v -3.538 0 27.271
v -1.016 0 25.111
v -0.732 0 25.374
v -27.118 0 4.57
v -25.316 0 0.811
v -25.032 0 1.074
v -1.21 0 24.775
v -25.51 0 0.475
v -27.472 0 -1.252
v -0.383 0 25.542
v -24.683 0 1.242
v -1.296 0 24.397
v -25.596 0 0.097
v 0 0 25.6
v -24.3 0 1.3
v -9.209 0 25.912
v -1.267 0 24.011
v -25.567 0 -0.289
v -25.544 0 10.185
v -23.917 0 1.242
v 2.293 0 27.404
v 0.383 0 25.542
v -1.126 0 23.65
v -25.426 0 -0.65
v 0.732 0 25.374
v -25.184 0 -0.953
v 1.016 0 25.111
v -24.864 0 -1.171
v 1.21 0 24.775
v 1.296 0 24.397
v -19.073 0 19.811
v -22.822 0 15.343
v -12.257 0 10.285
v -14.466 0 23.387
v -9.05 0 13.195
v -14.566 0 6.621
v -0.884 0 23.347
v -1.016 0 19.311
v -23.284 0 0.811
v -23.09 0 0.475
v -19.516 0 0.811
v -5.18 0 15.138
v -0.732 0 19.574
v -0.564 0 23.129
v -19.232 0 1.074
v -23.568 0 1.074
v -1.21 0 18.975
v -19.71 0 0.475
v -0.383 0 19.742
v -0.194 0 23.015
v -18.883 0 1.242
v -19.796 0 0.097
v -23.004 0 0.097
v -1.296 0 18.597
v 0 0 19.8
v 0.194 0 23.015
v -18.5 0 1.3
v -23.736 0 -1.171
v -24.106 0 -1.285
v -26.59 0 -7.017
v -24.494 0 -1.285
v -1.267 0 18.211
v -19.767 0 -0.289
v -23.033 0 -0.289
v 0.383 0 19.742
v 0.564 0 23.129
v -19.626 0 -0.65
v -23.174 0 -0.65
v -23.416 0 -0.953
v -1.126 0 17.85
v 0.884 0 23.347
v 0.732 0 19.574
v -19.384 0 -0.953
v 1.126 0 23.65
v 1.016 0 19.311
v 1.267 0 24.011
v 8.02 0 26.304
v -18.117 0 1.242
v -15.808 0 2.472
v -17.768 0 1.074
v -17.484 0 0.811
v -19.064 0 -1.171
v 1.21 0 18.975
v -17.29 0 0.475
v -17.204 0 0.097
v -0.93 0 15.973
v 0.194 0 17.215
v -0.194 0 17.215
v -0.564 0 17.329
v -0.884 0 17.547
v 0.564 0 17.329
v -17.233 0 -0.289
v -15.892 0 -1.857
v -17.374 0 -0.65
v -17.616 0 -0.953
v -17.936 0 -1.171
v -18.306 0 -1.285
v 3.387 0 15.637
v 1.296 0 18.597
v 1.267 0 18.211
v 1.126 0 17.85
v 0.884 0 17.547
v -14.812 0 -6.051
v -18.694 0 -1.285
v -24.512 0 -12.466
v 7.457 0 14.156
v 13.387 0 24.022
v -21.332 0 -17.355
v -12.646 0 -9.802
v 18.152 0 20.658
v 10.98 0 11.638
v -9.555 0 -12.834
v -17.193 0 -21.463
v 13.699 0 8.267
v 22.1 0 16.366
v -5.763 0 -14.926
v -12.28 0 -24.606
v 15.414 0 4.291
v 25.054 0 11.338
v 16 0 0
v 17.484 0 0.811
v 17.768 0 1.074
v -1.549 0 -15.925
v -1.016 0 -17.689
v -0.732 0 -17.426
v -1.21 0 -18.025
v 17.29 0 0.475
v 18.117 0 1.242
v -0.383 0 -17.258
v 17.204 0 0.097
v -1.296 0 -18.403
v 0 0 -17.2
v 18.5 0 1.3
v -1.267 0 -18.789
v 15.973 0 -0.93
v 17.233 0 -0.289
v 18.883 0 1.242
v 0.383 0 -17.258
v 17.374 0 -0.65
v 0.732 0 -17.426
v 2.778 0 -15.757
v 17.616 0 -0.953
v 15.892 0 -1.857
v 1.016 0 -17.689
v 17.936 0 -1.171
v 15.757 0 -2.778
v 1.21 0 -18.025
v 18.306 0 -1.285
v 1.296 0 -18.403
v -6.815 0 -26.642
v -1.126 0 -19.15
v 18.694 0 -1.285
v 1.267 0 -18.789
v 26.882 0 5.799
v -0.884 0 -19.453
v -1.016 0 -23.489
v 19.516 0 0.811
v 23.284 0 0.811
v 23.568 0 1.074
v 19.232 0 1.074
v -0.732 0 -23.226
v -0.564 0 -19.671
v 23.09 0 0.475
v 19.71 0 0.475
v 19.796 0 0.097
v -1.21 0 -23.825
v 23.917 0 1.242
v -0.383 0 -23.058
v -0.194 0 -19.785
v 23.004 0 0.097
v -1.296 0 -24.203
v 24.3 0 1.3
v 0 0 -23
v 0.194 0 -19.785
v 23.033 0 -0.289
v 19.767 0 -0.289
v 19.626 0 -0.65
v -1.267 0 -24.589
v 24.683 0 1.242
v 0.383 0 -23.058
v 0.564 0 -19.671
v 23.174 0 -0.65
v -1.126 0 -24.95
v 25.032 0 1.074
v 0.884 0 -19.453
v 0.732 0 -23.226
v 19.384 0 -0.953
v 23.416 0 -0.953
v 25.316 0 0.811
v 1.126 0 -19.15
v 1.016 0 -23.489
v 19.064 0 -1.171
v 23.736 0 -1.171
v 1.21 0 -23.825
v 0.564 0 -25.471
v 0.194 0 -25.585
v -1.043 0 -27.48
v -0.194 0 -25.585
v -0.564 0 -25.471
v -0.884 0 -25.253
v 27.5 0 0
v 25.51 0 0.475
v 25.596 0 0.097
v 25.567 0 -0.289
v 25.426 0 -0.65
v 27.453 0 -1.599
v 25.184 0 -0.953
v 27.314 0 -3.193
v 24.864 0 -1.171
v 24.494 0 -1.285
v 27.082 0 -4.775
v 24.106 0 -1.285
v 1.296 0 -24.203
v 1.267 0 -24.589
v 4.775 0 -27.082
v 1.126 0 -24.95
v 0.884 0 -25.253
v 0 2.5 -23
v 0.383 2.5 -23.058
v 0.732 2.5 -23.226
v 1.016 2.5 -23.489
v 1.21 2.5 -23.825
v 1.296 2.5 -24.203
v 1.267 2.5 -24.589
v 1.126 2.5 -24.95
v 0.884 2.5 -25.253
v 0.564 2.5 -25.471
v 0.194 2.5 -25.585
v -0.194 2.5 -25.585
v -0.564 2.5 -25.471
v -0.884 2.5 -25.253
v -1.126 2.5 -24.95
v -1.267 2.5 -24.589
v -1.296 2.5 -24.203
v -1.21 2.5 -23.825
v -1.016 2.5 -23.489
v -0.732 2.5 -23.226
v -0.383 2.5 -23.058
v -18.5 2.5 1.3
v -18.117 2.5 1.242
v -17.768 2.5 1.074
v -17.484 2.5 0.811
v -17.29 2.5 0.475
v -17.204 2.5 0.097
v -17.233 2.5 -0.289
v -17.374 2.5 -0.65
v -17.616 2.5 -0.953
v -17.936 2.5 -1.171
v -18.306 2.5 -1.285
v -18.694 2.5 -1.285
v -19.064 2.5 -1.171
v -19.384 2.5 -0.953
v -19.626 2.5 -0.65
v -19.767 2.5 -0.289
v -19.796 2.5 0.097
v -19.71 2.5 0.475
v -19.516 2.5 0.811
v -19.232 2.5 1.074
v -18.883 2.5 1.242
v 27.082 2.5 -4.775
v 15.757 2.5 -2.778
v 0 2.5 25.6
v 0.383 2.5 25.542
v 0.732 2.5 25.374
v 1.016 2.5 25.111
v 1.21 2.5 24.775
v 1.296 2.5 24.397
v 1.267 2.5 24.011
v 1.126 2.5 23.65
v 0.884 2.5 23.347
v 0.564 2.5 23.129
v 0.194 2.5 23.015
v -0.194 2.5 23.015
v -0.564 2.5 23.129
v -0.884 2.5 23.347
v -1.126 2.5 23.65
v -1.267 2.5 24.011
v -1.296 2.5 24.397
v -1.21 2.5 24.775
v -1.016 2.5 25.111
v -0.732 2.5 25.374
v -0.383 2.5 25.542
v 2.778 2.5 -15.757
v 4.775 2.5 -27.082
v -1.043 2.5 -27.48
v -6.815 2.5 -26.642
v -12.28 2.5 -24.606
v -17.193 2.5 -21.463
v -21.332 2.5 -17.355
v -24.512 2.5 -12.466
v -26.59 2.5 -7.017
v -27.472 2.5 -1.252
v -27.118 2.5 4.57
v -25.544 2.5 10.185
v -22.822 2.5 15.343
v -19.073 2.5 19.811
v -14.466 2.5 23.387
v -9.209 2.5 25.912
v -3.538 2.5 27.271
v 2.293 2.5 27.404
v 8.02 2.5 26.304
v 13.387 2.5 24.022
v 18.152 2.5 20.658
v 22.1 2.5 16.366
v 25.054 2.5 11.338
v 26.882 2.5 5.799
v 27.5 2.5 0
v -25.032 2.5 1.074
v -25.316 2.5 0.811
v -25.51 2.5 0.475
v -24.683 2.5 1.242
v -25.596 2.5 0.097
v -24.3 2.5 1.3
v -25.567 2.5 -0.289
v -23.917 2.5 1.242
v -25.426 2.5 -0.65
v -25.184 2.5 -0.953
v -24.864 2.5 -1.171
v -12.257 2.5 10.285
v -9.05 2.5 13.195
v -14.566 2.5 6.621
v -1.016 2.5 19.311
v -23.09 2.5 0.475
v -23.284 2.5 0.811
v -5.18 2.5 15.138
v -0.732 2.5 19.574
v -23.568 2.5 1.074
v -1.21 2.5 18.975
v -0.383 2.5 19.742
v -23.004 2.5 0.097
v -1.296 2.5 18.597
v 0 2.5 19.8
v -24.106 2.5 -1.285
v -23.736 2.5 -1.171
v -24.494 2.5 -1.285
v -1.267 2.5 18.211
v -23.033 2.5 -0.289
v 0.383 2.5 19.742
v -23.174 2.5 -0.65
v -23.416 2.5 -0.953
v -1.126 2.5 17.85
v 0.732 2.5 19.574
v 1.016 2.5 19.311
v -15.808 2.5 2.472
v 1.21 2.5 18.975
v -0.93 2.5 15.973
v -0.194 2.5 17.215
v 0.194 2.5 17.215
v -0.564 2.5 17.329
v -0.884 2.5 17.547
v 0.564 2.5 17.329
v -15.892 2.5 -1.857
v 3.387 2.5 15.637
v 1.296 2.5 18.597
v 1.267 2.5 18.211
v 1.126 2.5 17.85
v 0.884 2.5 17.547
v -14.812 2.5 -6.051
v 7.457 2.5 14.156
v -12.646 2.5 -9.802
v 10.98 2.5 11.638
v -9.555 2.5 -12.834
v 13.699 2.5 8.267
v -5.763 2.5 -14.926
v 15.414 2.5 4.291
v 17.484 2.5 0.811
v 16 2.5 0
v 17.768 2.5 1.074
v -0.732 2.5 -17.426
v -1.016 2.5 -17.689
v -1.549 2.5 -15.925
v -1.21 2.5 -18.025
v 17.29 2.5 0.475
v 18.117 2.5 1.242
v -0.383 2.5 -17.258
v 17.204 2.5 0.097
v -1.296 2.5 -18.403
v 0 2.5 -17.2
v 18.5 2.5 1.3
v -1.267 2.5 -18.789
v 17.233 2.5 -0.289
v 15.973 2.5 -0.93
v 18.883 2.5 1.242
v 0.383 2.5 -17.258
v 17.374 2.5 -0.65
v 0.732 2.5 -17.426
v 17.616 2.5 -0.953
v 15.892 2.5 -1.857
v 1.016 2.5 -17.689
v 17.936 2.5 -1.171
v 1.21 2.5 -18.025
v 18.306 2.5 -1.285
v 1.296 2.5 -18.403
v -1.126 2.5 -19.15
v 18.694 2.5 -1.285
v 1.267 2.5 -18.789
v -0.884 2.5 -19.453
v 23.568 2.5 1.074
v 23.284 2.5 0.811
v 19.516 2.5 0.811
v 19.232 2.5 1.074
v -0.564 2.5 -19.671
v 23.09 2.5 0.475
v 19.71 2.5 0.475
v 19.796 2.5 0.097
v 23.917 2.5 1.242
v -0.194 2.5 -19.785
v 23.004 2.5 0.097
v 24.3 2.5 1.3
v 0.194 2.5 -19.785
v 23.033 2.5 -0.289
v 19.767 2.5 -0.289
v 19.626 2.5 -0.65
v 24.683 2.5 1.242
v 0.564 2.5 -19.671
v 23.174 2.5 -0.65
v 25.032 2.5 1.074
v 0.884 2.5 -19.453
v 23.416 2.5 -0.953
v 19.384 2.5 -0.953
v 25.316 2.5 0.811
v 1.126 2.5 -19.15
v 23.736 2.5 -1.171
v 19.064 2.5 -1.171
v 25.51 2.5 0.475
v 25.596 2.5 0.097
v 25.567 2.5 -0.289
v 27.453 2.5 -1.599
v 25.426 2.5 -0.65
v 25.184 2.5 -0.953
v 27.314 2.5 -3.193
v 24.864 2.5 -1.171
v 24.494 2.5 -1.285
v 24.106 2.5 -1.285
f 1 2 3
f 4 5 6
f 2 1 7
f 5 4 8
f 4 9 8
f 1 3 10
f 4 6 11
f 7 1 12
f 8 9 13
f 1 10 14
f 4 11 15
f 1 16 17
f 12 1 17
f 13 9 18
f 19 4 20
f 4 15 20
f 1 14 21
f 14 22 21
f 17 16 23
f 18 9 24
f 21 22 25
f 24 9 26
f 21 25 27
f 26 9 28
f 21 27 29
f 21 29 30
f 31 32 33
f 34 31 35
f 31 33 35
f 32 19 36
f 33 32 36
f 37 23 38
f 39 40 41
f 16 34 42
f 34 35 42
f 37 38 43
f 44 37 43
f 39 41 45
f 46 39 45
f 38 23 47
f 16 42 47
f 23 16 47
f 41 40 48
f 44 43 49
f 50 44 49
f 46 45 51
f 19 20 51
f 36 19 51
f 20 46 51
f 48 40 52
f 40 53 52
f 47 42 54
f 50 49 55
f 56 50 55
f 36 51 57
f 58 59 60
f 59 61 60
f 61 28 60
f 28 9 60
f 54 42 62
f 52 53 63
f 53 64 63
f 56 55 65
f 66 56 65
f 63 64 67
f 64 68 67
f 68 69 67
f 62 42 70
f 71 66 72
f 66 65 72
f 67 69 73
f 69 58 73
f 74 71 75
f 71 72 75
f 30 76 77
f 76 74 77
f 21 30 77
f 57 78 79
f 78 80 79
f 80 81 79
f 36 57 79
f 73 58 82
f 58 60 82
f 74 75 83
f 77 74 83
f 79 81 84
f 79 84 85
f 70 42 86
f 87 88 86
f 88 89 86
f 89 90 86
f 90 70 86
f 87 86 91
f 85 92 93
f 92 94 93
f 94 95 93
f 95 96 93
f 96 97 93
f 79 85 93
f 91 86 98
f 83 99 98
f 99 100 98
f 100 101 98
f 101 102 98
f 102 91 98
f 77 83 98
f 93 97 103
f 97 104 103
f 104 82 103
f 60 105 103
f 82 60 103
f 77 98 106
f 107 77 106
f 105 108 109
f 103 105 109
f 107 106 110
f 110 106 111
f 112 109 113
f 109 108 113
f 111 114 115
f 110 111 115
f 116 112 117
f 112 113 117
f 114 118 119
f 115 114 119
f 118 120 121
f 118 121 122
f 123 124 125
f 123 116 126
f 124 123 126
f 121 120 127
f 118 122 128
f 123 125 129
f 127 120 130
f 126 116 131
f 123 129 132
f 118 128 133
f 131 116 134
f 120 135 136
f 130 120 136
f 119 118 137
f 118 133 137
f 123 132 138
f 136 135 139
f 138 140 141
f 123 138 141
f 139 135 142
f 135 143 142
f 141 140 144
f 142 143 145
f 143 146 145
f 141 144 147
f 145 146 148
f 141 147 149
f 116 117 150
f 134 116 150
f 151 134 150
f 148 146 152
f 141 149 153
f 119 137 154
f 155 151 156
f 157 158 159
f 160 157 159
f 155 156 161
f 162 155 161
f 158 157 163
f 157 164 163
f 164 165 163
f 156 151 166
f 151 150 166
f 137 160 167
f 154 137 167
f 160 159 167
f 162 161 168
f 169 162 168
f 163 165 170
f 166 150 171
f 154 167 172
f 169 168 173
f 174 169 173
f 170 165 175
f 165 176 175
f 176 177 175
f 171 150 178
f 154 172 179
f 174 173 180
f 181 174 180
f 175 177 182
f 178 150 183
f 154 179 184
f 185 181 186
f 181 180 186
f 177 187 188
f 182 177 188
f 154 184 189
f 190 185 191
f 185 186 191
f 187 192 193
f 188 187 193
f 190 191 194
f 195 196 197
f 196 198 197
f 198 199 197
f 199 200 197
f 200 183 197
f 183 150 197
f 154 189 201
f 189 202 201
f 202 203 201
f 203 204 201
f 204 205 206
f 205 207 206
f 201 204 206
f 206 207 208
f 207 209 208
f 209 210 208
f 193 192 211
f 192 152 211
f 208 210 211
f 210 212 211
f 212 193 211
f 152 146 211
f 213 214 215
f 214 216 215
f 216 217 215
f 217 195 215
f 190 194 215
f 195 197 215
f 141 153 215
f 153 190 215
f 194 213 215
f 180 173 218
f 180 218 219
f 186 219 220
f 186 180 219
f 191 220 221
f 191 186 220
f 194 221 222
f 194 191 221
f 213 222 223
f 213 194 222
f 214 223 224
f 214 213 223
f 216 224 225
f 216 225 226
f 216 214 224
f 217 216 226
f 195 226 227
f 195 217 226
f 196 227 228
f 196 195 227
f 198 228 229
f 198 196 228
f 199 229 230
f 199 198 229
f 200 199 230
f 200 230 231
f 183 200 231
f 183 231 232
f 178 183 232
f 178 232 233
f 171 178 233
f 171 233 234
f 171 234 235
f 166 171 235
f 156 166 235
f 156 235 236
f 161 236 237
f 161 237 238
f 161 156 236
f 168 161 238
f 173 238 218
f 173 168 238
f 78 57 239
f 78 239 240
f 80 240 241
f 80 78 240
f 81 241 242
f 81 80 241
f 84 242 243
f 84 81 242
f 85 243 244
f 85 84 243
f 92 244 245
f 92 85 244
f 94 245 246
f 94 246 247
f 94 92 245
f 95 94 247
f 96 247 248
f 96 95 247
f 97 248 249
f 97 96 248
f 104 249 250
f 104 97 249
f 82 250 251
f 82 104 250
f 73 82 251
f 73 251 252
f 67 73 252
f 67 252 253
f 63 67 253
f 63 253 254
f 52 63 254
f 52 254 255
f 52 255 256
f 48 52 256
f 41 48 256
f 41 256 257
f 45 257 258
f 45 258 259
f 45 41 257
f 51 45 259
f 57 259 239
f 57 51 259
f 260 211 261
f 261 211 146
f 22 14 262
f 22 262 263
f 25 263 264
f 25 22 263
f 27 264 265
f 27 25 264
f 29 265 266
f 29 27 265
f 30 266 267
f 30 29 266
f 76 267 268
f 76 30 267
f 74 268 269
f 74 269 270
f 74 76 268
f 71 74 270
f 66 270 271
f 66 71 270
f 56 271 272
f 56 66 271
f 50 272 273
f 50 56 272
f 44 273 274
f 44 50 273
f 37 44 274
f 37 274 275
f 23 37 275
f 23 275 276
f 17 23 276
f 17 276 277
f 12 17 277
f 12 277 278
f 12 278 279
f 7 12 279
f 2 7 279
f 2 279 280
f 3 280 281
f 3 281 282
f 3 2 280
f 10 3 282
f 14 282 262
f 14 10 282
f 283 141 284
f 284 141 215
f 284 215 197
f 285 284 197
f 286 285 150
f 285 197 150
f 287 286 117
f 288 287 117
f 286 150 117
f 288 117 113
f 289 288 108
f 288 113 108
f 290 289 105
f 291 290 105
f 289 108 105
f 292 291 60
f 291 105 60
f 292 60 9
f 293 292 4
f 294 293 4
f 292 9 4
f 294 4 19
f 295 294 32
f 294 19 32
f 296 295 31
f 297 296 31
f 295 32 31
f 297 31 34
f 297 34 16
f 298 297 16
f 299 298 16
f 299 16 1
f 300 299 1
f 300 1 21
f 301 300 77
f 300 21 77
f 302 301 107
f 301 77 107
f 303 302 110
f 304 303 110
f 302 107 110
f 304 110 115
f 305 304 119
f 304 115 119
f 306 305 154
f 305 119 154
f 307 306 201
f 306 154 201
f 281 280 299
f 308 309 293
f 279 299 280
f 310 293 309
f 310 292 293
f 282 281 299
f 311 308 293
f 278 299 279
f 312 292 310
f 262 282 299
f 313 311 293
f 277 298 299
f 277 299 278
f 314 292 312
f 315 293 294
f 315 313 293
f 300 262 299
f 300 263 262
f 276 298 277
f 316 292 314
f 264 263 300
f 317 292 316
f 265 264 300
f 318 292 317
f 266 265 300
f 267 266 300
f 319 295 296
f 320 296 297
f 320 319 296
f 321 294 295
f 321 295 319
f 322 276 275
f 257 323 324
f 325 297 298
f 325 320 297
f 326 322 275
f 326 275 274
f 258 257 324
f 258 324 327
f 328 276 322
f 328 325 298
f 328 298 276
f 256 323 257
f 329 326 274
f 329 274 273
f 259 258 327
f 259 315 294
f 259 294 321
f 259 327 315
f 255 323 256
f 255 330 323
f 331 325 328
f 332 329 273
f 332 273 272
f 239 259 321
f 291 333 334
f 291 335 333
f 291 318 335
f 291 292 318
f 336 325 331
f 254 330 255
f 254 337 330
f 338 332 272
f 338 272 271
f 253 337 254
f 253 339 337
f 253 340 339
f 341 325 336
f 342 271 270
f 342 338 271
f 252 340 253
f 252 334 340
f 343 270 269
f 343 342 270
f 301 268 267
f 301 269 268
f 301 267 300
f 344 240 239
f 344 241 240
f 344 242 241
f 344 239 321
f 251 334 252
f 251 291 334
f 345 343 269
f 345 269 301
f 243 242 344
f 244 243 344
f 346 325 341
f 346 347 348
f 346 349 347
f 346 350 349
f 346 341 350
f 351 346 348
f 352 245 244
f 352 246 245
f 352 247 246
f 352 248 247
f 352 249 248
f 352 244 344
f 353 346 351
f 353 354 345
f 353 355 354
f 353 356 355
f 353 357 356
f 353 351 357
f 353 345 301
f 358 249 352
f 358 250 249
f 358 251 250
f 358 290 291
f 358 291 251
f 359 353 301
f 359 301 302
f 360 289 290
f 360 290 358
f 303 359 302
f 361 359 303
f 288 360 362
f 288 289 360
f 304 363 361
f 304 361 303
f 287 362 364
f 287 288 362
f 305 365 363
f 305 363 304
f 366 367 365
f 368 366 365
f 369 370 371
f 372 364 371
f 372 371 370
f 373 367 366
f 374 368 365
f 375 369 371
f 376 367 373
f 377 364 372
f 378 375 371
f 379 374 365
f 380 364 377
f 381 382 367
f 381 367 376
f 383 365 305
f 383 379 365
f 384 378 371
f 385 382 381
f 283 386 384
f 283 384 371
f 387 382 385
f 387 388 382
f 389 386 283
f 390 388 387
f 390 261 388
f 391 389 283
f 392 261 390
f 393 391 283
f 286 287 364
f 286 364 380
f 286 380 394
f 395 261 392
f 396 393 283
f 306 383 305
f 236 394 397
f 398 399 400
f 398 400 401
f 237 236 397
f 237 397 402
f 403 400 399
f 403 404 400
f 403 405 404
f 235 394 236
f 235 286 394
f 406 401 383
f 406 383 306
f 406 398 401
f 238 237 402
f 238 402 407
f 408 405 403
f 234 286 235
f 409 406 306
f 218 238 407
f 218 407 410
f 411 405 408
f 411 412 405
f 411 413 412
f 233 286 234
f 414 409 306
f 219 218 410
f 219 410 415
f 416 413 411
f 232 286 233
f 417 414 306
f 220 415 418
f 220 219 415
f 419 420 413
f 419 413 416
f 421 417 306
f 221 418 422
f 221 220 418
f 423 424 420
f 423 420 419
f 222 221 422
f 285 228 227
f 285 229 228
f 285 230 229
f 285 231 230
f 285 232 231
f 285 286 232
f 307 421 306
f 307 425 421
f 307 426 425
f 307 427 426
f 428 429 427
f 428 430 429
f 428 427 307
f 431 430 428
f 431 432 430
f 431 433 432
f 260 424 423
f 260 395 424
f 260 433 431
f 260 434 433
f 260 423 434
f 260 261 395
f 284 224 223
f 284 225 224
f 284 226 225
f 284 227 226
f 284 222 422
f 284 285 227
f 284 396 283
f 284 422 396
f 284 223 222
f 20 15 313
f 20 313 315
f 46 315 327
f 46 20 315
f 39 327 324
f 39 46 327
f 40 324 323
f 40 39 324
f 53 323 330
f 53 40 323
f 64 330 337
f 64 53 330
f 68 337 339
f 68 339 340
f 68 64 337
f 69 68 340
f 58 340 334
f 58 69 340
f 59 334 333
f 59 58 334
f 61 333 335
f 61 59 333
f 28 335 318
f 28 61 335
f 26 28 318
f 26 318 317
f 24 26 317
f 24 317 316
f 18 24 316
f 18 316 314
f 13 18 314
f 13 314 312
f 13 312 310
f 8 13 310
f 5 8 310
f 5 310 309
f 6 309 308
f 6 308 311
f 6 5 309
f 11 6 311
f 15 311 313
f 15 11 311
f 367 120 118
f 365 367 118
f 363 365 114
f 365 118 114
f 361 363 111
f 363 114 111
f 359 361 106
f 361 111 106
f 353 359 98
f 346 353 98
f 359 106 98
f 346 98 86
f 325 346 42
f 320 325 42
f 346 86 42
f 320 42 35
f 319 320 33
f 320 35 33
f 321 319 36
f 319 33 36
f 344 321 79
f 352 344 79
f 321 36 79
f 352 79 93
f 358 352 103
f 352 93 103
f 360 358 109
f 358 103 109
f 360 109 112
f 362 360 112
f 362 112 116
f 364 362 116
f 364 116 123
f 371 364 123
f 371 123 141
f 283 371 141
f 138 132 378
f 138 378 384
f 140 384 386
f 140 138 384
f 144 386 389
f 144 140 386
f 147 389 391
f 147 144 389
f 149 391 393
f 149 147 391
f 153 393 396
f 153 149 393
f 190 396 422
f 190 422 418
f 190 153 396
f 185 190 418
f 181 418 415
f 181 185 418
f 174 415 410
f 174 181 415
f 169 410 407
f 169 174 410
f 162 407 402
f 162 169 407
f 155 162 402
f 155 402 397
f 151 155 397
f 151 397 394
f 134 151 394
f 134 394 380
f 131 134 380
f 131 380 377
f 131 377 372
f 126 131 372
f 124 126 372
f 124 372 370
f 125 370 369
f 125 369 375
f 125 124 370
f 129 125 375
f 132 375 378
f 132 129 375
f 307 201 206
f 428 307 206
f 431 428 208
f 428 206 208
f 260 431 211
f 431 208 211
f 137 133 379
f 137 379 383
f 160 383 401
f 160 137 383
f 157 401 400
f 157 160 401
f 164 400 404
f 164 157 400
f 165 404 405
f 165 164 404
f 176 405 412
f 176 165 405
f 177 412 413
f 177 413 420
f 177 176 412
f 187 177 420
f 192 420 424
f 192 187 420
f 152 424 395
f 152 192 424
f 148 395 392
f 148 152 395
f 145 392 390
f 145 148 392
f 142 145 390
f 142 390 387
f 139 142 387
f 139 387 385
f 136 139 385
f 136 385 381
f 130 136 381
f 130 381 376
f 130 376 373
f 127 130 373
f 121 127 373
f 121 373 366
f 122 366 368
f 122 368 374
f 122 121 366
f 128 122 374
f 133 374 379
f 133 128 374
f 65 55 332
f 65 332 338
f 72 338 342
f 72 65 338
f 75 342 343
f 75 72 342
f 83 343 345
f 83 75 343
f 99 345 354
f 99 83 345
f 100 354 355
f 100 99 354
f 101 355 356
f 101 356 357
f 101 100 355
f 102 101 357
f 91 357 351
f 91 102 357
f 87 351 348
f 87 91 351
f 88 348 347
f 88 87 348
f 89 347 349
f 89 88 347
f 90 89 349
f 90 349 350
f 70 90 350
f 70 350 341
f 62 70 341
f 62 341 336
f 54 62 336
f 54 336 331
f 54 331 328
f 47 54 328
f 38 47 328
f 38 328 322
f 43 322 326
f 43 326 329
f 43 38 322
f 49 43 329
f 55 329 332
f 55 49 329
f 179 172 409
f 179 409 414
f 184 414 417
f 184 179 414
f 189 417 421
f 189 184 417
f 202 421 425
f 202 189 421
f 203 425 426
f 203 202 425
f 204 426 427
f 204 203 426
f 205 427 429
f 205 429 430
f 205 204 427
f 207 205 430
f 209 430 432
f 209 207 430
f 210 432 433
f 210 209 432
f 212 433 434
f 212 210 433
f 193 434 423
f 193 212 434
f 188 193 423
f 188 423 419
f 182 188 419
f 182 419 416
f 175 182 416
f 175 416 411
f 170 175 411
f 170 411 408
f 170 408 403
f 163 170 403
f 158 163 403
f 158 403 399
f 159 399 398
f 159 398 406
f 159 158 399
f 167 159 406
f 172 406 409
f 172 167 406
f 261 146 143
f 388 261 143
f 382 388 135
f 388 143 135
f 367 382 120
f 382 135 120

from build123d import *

# Parameters (mm, degrees)
SKETCH1_R           = 1.3
BOSS_EXTRUDE1_DEPTH = 2.5


with BuildPart() as part:
    # Sketch1 → Boss-Extrude1 (new body)
    with BuildSketch(Plane(origin=(0, 0, 0), x_dir=(1, 0, 0), z_dir=(0, 1, 0))):
        with BuildLine():
            ThreePointArc((16, 0), (-12.25671109, -10.284601755), (2.778370843, 15.756924048))
            Line((2.778370843, 15.756924048), (4.775324886, 27.082213208))
            ThreePointArc((4.775324886, 27.082213208), (-21.066222186, -17.676659266), (27.5, 0))
            ThreePointArc((27.5, 0), (27.395354198, 2.396782926), (27.082213208, 4.775324886))
            Line((27.082213208, 4.775324886), (15.756924048, 2.778370843))
            ThreePointArc((15.756924048, 2.778370843), (15.939115169, 1.394491884), (16, 0))
        make_face()
        with Locations(Location((0, -24.3, 0), (0, 0, 270))):
            Circle(SKETCH1_R, mode=Mode.SUBTRACT)
        with Locations(Location((0, -18.5, 0), (0, 0, 270))):
            Circle(SKETCH1_R, mode=Mode.SUBTRACT)
        with Locations(Location((-24.3, 0, 0), (0, 0, 270))):
            Circle(SKETCH1_R, mode=Mode.SUBTRACT)
        with Locations(Location((-18.5, 0, 0), (0, 0, 270))):
            Circle(SKETCH1_R, mode=Mode.SUBTRACT)
        with Locations(Location((0, 18.5, 0), (0, 0, 270))):
            Circle(SKETCH1_R, mode=Mode.SUBTRACT)
        with Locations(Location((18.5, 0, 0), (0, 0, 270))):
            Circle(SKETCH1_R, mode=Mode.SUBTRACT)
        with Locations(Location((24.3, 0, 0), (0, 0, 270))):
            Circle(SKETCH1_R, mode=Mode.SUBTRACT)
        with Locations(Location((0, 24.3, 0), (0, 0, 270))):
            Circle(SKETCH1_R, mode=Mode.SUBTRACT)
    extrude(amount=BOSS_EXTRUDE1_DEPTH)


solid = part.part
